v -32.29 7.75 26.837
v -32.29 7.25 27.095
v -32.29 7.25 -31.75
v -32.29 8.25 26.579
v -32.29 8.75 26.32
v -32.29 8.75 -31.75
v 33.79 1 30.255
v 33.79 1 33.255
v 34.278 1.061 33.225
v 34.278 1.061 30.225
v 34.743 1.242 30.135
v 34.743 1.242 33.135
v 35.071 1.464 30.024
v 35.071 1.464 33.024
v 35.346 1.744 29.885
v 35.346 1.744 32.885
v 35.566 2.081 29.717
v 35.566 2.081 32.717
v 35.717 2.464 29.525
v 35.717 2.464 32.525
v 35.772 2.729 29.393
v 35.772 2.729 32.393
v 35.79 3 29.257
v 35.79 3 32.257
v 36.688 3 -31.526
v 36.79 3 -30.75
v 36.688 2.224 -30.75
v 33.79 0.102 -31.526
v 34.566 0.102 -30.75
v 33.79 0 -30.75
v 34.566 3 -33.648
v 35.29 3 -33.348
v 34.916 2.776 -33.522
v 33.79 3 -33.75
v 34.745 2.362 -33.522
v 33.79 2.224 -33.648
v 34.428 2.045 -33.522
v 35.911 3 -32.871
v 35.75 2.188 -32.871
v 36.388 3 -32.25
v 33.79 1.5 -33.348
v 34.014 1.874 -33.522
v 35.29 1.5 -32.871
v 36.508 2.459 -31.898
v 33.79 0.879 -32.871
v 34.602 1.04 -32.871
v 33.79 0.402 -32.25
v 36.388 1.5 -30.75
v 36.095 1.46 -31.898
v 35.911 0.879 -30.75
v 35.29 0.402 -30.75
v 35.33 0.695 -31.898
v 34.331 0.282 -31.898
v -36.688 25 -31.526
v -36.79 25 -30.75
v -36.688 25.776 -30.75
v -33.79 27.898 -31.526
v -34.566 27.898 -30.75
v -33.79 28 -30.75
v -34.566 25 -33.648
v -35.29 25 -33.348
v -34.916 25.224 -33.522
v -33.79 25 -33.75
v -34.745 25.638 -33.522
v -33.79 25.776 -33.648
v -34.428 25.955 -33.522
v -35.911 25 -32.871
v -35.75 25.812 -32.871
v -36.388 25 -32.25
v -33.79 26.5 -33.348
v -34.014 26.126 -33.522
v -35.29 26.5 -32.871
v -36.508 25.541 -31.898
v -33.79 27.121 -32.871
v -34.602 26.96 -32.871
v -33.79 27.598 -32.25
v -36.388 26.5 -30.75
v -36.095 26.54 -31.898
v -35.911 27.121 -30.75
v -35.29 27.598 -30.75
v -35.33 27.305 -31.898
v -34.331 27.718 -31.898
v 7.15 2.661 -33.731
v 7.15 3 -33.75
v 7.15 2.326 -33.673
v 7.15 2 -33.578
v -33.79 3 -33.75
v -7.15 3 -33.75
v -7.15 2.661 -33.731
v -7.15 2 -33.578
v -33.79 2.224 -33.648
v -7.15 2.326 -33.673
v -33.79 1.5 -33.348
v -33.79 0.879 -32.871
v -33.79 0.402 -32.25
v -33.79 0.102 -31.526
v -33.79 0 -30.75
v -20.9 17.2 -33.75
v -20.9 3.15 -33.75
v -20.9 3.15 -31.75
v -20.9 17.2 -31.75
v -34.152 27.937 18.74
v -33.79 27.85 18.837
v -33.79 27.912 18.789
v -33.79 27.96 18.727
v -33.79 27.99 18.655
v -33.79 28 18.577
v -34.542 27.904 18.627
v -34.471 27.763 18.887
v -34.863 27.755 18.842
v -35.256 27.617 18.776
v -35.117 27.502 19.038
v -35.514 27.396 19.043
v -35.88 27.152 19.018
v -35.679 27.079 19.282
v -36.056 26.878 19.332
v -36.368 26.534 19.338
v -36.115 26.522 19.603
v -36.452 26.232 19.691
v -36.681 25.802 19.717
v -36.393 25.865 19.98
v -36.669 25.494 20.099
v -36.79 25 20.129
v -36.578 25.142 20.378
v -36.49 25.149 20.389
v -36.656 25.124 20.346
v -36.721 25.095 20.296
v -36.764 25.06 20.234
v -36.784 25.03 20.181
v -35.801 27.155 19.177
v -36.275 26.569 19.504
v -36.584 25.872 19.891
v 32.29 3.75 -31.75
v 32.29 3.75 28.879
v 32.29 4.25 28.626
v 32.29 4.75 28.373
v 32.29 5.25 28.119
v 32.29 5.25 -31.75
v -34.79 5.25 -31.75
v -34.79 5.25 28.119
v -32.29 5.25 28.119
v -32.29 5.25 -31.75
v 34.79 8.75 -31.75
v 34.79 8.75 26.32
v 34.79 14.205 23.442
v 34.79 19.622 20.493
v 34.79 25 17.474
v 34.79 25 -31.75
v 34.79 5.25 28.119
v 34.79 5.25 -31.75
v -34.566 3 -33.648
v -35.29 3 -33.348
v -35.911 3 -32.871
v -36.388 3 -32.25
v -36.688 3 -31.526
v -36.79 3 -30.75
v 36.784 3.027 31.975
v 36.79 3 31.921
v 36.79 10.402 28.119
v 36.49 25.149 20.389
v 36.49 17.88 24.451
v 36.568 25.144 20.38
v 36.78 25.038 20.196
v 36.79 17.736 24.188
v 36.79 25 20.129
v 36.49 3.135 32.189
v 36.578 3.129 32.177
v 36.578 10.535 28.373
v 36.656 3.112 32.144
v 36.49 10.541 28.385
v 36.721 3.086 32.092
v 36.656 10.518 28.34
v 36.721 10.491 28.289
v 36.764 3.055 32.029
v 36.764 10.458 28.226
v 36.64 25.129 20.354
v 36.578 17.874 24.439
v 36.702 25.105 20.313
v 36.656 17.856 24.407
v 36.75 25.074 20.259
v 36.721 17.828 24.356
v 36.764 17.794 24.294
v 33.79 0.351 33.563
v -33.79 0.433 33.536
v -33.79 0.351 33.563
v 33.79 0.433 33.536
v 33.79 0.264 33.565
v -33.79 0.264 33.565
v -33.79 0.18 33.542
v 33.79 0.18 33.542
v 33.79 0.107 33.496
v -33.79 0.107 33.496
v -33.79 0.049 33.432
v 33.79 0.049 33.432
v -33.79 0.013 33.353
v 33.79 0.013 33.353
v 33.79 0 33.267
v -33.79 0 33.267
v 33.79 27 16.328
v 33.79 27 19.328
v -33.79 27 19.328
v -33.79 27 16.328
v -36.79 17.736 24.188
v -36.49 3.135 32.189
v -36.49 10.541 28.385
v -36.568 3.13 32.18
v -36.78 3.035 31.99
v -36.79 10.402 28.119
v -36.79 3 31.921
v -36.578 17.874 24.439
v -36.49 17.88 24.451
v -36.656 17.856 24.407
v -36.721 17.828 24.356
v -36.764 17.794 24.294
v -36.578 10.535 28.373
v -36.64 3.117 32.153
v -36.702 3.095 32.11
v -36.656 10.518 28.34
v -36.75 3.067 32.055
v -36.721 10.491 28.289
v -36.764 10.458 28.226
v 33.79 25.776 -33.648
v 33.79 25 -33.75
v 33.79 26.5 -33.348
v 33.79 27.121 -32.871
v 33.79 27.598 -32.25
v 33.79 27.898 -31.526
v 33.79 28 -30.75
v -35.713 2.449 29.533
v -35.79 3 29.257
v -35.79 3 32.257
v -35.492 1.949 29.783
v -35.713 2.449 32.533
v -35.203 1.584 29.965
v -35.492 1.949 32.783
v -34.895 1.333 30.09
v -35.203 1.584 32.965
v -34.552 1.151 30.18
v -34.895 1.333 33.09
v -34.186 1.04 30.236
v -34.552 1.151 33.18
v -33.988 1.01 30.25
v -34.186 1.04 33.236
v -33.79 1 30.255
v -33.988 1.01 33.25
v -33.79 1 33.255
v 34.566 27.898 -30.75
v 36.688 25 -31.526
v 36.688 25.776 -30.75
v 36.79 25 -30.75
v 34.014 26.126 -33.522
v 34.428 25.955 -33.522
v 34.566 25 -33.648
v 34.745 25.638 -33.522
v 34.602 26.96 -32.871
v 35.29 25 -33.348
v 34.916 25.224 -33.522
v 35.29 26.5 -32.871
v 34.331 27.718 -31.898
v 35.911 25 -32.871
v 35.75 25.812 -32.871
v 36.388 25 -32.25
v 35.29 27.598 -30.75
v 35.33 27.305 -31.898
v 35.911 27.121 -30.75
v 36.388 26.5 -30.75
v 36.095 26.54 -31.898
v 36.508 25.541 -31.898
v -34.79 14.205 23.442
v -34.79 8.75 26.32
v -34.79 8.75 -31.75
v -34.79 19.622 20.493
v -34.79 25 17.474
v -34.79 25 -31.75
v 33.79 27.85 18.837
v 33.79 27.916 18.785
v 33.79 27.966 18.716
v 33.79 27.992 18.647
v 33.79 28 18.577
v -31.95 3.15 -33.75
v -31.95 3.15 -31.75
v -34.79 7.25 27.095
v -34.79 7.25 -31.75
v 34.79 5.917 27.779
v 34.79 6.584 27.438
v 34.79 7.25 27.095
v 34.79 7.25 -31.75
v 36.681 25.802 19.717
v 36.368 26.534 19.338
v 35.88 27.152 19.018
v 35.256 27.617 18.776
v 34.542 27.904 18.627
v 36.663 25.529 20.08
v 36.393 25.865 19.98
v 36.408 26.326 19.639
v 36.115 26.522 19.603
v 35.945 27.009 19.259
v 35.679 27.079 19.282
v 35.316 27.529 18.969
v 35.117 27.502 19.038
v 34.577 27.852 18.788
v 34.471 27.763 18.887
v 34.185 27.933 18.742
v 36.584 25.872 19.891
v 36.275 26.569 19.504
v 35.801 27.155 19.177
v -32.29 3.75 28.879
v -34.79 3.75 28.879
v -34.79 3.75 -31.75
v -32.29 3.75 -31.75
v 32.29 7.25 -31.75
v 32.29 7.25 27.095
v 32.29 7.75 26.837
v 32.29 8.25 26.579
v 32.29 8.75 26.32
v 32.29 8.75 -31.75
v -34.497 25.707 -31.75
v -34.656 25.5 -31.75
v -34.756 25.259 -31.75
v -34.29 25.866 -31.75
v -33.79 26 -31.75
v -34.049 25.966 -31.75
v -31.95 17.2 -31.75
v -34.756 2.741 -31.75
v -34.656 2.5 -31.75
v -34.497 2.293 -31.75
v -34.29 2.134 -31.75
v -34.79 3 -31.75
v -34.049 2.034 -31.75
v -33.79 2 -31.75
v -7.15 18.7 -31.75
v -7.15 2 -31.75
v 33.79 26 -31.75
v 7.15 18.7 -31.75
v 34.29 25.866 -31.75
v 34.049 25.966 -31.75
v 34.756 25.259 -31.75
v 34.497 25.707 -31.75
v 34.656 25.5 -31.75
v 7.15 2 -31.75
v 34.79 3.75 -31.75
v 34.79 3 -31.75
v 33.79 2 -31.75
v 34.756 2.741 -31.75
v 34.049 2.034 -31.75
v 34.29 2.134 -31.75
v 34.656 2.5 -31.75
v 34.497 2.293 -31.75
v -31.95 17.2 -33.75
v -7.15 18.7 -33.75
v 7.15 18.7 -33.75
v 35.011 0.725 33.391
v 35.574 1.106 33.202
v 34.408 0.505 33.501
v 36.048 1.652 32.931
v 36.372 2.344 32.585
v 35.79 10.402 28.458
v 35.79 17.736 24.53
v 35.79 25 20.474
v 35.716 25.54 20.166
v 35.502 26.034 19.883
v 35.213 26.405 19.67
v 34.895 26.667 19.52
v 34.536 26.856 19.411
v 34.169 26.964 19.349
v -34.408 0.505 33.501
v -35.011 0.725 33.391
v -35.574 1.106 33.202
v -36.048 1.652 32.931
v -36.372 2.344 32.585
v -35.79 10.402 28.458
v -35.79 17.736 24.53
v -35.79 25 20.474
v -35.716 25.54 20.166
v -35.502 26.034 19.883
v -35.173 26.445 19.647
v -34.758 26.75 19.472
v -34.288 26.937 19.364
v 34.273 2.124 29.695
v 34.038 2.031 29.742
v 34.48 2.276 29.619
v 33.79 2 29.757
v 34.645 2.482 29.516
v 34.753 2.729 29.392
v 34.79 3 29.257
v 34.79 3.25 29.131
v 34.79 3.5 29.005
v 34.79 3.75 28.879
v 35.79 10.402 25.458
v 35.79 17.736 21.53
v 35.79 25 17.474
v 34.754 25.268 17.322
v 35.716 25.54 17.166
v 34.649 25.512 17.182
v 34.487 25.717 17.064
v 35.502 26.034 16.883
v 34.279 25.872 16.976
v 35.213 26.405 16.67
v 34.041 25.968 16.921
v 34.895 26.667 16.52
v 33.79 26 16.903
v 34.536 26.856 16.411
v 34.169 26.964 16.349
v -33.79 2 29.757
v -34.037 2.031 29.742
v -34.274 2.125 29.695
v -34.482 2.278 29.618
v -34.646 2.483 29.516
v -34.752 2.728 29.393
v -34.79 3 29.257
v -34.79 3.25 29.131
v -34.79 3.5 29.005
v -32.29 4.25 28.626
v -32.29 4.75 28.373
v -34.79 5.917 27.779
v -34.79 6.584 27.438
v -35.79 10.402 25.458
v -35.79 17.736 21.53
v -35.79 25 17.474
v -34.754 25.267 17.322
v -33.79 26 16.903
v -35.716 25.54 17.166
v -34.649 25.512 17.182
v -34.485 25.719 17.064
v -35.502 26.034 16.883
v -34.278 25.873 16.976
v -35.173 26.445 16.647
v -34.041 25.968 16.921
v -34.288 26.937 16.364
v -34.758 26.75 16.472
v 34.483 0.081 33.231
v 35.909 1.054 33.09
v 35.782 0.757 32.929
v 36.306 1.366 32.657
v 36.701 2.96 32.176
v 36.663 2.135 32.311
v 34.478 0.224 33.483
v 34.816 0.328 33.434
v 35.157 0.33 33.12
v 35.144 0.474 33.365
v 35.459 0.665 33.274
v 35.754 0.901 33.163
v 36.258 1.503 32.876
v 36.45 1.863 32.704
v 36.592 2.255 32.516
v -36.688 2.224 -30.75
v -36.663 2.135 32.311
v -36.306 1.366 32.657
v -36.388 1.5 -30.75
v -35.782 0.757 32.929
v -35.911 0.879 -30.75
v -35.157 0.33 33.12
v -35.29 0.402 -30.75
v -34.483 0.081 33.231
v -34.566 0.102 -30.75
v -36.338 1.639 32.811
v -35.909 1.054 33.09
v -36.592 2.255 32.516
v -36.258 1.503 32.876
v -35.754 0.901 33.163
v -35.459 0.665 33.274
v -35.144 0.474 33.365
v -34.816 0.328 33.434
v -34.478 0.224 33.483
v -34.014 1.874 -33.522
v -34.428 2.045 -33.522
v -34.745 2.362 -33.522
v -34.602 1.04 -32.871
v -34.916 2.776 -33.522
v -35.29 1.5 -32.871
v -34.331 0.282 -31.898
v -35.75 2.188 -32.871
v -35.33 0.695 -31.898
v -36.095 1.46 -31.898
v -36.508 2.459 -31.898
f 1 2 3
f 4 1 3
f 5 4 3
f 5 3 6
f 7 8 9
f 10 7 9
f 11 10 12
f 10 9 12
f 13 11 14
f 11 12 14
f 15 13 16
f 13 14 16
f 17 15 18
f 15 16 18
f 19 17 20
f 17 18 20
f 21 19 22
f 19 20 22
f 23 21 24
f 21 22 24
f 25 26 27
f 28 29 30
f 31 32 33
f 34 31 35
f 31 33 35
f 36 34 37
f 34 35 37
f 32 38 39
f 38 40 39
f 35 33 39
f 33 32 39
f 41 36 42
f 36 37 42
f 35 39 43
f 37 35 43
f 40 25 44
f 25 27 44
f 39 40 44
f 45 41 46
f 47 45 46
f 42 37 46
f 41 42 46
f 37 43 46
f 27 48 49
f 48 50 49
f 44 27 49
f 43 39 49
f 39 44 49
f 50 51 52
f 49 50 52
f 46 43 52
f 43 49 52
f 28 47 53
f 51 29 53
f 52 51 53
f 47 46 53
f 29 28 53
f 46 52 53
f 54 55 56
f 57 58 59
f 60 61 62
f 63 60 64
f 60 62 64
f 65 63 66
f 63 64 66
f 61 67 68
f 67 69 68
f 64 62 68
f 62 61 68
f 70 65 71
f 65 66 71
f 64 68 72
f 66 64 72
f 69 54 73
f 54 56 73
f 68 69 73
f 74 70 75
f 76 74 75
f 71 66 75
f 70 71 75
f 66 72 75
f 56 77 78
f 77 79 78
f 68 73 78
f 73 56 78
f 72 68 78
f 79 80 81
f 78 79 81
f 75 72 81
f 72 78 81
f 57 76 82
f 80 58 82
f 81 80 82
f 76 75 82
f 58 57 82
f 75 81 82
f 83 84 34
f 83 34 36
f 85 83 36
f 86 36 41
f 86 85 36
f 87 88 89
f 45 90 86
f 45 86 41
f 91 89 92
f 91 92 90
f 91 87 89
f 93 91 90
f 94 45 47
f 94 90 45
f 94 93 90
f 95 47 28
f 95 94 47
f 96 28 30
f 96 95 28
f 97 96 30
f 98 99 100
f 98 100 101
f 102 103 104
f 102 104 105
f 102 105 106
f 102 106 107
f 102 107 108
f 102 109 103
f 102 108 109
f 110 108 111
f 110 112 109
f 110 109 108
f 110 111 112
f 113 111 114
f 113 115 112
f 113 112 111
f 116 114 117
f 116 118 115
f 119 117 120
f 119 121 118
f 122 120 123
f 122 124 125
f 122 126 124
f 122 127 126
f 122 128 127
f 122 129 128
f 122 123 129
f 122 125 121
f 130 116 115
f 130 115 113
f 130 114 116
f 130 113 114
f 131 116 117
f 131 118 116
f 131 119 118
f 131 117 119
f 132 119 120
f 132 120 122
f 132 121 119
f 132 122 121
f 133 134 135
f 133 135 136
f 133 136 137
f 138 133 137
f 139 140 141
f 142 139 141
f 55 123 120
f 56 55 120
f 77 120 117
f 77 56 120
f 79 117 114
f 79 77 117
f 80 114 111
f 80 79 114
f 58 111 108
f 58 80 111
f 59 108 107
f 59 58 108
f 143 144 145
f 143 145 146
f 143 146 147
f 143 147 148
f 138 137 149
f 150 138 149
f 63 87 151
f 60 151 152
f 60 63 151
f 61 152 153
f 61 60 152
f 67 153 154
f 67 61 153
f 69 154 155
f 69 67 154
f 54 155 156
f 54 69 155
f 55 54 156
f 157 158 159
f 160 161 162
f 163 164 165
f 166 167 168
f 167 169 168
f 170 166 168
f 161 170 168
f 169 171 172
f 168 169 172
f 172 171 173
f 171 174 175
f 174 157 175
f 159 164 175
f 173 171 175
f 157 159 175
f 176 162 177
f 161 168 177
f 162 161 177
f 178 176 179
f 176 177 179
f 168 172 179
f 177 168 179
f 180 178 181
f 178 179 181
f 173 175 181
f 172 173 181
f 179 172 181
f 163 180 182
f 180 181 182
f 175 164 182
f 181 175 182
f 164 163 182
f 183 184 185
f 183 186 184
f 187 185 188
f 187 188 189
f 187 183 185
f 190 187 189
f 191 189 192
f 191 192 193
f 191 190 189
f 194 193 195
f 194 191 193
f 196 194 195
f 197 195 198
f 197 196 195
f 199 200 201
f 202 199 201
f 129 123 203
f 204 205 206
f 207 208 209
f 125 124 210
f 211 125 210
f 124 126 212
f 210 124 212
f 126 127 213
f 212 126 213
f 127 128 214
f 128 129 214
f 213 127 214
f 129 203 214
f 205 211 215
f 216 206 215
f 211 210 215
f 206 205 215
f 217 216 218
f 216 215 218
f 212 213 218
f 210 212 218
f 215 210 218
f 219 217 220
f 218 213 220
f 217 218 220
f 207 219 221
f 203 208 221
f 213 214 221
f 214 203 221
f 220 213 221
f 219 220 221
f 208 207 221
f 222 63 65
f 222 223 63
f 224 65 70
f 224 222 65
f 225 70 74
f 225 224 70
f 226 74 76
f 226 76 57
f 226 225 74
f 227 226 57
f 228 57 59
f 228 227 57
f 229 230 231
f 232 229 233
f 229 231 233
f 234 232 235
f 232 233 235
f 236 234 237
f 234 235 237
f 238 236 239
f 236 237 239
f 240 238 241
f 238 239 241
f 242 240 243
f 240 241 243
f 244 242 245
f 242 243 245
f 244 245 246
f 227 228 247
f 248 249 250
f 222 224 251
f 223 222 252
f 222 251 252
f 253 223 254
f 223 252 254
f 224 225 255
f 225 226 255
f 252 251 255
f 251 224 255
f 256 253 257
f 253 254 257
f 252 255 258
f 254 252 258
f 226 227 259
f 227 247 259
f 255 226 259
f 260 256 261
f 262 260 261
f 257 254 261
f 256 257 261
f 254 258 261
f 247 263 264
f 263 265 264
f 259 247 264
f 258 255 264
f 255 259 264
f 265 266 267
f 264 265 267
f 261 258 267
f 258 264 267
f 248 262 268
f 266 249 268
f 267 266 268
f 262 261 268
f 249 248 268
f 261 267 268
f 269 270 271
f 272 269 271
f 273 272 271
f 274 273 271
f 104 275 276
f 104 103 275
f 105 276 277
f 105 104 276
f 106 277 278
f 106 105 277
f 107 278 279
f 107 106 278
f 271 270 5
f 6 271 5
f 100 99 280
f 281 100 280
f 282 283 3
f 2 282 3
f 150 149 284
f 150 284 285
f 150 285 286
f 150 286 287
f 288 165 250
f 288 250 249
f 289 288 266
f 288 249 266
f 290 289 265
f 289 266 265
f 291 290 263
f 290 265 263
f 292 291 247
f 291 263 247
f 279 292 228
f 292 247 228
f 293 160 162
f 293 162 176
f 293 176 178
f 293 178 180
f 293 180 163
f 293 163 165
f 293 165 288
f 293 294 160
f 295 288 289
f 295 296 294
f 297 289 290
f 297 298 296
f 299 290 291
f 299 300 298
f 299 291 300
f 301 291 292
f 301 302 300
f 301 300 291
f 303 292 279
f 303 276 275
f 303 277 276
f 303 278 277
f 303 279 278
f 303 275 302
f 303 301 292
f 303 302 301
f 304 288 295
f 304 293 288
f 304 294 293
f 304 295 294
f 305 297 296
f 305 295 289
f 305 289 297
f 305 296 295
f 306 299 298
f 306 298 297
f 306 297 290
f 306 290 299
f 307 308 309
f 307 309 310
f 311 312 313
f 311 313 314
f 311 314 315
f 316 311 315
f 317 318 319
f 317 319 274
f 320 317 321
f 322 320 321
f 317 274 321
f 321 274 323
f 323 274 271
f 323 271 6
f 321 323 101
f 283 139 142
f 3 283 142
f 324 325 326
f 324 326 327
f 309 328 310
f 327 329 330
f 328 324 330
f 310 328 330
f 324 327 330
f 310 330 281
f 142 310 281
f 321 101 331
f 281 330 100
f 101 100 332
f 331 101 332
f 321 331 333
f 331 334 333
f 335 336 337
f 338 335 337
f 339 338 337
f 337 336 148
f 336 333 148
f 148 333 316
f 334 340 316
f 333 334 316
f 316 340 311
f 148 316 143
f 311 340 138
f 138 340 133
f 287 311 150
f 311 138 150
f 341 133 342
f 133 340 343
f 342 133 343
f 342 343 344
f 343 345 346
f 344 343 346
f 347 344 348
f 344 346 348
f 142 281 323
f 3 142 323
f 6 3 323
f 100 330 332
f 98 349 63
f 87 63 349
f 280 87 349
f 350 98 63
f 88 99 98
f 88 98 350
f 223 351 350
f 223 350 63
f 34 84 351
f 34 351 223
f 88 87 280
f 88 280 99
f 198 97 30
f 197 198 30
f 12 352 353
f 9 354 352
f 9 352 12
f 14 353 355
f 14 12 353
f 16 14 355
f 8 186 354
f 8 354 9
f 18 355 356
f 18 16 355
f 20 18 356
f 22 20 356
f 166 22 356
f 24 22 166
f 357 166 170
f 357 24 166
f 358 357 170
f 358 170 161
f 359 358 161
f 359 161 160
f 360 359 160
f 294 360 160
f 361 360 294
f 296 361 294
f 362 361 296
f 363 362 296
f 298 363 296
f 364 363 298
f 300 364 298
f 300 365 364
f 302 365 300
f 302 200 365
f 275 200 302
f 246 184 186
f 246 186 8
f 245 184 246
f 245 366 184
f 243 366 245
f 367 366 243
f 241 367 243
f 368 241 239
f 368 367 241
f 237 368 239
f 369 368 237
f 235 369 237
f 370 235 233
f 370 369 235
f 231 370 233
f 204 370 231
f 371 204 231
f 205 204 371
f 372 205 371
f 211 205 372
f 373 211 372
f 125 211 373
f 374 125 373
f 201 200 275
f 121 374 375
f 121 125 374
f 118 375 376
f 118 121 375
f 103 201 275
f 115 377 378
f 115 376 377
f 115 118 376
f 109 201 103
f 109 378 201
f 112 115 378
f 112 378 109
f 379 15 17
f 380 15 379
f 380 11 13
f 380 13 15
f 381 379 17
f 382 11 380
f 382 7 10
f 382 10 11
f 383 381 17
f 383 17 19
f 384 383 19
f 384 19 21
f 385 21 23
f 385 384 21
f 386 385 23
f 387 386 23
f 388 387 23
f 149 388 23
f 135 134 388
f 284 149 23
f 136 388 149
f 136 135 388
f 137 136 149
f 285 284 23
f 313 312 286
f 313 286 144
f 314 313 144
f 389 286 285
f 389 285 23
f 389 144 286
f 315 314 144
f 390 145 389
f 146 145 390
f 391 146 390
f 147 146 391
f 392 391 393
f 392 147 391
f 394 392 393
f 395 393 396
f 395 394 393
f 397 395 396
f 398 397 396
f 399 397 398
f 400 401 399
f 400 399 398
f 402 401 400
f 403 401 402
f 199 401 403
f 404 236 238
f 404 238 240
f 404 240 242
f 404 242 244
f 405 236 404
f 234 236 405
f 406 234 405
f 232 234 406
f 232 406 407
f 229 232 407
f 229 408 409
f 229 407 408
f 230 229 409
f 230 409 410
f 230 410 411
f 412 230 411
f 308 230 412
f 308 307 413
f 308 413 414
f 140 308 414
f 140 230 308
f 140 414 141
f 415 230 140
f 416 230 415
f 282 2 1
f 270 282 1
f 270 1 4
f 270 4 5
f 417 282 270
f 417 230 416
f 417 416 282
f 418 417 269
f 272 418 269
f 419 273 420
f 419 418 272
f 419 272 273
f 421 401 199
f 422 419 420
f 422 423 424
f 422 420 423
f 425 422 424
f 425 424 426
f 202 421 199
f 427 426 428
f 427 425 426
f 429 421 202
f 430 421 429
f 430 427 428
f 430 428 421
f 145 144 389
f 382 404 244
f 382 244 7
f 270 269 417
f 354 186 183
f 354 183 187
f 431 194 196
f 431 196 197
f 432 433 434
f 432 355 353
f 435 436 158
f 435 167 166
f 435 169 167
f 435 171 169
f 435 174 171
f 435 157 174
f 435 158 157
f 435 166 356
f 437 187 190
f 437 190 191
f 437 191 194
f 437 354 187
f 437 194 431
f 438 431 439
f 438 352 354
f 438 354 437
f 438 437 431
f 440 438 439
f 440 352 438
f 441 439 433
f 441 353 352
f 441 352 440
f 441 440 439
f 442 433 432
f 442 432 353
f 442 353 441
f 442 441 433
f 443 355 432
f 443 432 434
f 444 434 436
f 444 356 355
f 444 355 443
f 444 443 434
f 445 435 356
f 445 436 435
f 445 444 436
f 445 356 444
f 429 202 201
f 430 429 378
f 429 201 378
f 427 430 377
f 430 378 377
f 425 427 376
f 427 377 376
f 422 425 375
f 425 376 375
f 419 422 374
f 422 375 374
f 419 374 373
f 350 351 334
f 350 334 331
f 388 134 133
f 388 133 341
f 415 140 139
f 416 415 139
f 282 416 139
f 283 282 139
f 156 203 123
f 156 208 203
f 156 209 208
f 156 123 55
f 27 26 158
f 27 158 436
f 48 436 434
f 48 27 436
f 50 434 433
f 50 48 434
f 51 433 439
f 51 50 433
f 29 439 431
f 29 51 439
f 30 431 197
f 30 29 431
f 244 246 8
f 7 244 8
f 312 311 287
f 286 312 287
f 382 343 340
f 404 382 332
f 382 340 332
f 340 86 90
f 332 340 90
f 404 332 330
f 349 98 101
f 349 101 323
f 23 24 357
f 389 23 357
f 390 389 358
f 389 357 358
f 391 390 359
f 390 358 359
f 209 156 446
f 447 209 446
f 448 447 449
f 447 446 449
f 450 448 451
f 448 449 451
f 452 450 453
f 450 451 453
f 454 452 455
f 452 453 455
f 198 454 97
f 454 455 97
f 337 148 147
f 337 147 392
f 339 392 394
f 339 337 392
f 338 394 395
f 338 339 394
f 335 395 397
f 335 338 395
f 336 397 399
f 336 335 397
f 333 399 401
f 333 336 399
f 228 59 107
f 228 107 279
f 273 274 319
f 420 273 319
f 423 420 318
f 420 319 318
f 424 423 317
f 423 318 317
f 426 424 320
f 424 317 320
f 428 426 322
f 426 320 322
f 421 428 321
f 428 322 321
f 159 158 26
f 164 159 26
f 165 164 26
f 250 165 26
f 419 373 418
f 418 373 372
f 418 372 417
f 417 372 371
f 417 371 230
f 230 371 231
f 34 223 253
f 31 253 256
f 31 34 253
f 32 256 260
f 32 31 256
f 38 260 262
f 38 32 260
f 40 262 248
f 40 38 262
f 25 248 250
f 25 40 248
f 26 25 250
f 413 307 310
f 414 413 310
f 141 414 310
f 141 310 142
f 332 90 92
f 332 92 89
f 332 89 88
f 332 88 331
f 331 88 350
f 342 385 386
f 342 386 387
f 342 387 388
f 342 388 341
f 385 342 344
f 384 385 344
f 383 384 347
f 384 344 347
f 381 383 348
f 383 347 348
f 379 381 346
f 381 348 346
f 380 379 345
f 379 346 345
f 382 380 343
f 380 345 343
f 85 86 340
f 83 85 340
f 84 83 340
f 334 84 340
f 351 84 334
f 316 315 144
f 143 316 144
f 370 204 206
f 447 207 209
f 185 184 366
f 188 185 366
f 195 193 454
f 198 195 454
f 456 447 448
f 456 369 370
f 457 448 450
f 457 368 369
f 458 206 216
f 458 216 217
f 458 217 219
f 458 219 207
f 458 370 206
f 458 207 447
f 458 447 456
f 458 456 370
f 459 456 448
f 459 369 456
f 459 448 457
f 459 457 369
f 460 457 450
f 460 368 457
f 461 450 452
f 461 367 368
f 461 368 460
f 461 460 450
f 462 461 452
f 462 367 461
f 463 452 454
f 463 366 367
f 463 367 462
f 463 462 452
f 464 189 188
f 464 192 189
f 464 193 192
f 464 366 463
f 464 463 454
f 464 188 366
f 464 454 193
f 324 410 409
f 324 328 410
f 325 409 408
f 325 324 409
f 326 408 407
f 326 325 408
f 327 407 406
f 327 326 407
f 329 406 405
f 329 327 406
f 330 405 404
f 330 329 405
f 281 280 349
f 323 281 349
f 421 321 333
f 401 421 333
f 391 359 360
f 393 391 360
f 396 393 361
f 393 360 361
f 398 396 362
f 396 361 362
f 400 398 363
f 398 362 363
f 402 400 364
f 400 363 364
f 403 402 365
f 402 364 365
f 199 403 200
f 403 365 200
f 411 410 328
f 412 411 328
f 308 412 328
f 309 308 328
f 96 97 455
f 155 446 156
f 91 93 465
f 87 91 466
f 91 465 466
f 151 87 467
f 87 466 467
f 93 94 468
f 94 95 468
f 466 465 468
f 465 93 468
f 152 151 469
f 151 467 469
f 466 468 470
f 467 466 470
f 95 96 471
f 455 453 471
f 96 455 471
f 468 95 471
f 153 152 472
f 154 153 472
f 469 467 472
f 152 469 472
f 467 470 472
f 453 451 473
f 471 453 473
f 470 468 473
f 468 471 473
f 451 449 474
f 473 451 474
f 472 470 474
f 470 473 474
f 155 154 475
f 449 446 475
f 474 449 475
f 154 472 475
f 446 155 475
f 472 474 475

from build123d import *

# Parameters (mm, degrees)
SKETCH1_W                = 73.58
SKETCH1_H                = 67.5
BOSS_EXTRUDE1_DEPTH      = 28
FILLET1_R                = 3
SHELL1_T                 = -2
CUT_EXTRUDE1_DEPTH       = 86.656750464
FILLET2_R                = 3
CUT_EXTRUDE3_REACH       = 162.173
CUT_EXTRUDE3_END_RADIUS  = 475
CUT_EXTRUDE3_START       = 80
FILLET3_R                = 0.3
BOSS_EXTRUDE2_REACH      = 82.024
BOSS_EXTRUDE2_END_RADIUS = 475
SKETCH5_W                = 2.5
SKETCH5_H                = 1.5
SKETCH6_W                = 14.3
SKETCH6_H                = 16.7
SKETCH6_W_2              = 11.05
SKETCH6_H_2              = 14.049996967
CUT_EXTRUDE4_DEPTH       = 2


with BuildPart() as part:
    # Sketch1 → Boss-Extrude1 (new body)
    with BuildSketch(Plane(origin=(0, 0, 0), x_dir=(1, 0, 0), z_dir=(0, 1, 0))):
        Rectangle(SKETCH1_W, SKETCH1_H)
    extrude(amount=BOSS_EXTRUDE1_DEPTH)

    # Fillet1
    fillet1_edges = [part.edges().sort_by_distance(p)[0] for p in [
        (-36.79, 28, 0),
        (36.79, 28, 0),
        (-36.79, 0, 0),
        (36.79, 0, 0),
    ]]
    fillet(fillet1_edges, radius=FILLET1_R)

    # Shell1
    shell1_openings = [part.faces().sort_by_distance(p)[0] for p in [
        (0, 14, 33.75),
    ]]
    offset(amount=SHELL1_T, openings=shell1_openings, kind=Kind.INTERSECTION)

    # Sketch2 → Cut-Extrude1 (cut, through all)
    with BuildSketch(Plane.ZY.offset(36.79)):
        with BuildLine():
            Line((18.75, 28), (33.75, 28))
            Line((33.75, 28), (33.75, 0))
            ThreePointArc((33.75, 0), (26.484121584, 14.125422277), (18.75, 28))
        make_face()
    extrude(amount=-CUT_EXTRUDE1_DEPTH, mode=Mode.SUBTRACT)

    # Fillet2
    fillet2_edges = [part.edges().sort_by_distance(p)[0] for p in [
        (0, 28, -33.75),
        (0, 0, -33.75),
        (-36.79, 14, -33.75),
        (36.79, 14, -33.75),
        (-35.911320344, 27.121320344, -33.75),
        (-35.911320344, 0.878679656, -33.75),
        (35.911320344, 0.878679656, -33.75),
        (35.911320344, 27.121320344, -33.75),
    ]]
    fillet(fillet2_edges, radius=FILLET2_R)

    # Cut-Extrude3: up to this cylinder (the profile starts outside it)
    cut_extrude3_end = Plane(origin=(0, -210.179748667, -395.218864179), z_dir=(-1, 0, 0)) * Cylinder(CUT_EXTRUDE3_END_RADIUS, 1275.346, mode=Mode.PRIVATE)
    # Sketch4 → Cut-Extrude3 (cut, up to the surface)
    with BuildSketch(Plane.XY.offset(-31.75).offset(CUT_EXTRUDE3_START), mode=Mode.PRIVATE) as cut_extrude3_sk1:
        with BuildLine():
            Line((33.79, 27), (-33.79, 27))
            ThreePointArc((-33.79, 27), (-35.204213562, 26.414213562), (-35.79, 25))
            Line((-35.79, 25), (-35.79, 3))
            ThreePointArc((-35.79, 3), (-35.204213562, 1.585786438), (-33.79, 1))
            Line((-33.79, 1), (33.79, 1))
            ThreePointArc((33.79, 1), (35.204213562, 1.585786438), (35.79, 3))
            Line((35.79, 3), (35.79, 25))
            ThreePointArc((35.79, 25), (35.204213562, 26.414213562), (33.79, 27))
        make_face()
        with BuildLine():
            Line((33.79, 26), (-33.79, 26))
            ThreePointArc((-33.79, 26), (-34.497106781, 25.707106781), (-34.79, 25))
            Line((-34.79, 25), (-34.79, 3))
            ThreePointArc((-34.79, 3), (-34.497106781, 2.292893219), (-33.79, 2))
            Line((-33.79, 2), (33.79, 2))
            ThreePointArc((33.79, 2), (34.497106781, 2.292893219), (34.79, 3))
            Line((34.79, 3), (34.79, 25))
            ThreePointArc((34.79, 25), (34.497106781, 25.707106781), (33.79, 26))
        make_face(mode=Mode.SUBTRACT)
    cut_extrude3_tool1 = extrude(cut_extrude3_sk1.sketch, amount=-CUT_EXTRUDE3_REACH, mode=Mode.PRIVATE) - cut_extrude3_end
    add(cut_extrude3_tool1.solids().sort_by_distance((0, 26.238443, 48.25))[0], mode=Mode.SUBTRACT)

    # Fillet3
    fillet3_edges = [part.edges().sort_by_distance(p)[0] for p in [
        (0, 0, 33.75),
        (-36.79, 14.077394683, 26.509847108),
        (35.984331752, 27.045704827, 19.301590008),
        (35.969562436, 0.938566613, 33.285609296),
        (-35.969562436, 0.938566613, 33.285609296),
        (-35.984331752, 27.045704827, 19.301590008),
        (36.79, 14.077394683, 26.509847108),
        (0, 28, 18.75),
    ]]
    fillet(fillet3_edges, radius=FILLET3_R)

    # Boss-Extrude2: up to this cylinder (the profile starts inside it)
    boss_extrude2_end = Plane(origin=(0, -210.179748667, -395.218864179), z_dir=(-1, 0, 0)) * Cylinder(BOSS_EXTRUDE2_END_RADIUS, 1182.128, mode=Mode.PRIVATE)
    # Sketch5 → Boss-Extrude2 (add, up to the surface)
    with BuildSketch(Plane.XY.offset(-31.75), mode=Mode.PRIVATE) as boss_extrude2_sk1:
        with Locations((33.54, 4.5)):
            Rectangle(SKETCH5_W, SKETCH5_H)
    boss_extrude2_tool1 = extrude(boss_extrude2_sk1.sketch, amount=BOSS_EXTRUDE2_REACH, mode=Mode.PRIVATE) & boss_extrude2_end
    add(boss_extrude2_tool1.solids().sort_by_distance((33.54, 4.5, -31.75))[0])
    # Sketch5 → Boss-Extrude2 (add, up to the surface)
    with BuildSketch(Plane.XY.offset(-31.75), mode=Mode.PRIVATE) as boss_extrude2_sk2:
        with Locations((33.54, 8)):
            Rectangle(SKETCH5_W, SKETCH5_H)
    boss_extrude2_tool2 = extrude(boss_extrude2_sk2.sketch, amount=BOSS_EXTRUDE2_REACH, mode=Mode.PRIVATE) & boss_extrude2_end
    add(boss_extrude2_tool2.solids().sort_by_distance((33.54, 8, -31.75))[0])
    # Sketch5 → Boss-Extrude2 (add, up to the surface)
    with BuildSketch(Plane.XY.offset(-31.75), mode=Mode.PRIVATE) as boss_extrude2_sk3:
        with Locations((-33.54, 8)):
            Rectangle(SKETCH5_W, SKETCH5_H)
    boss_extrude2_tool3 = extrude(boss_extrude2_sk3.sketch, amount=BOSS_EXTRUDE2_REACH, mode=Mode.PRIVATE) & boss_extrude2_end
    add(boss_extrude2_tool3.solids().sort_by_distance((-33.54, 8, -31.75))[0])
    # Sketch5 → Boss-Extrude2 (add, up to the surface)
    with BuildSketch(Plane.XY.offset(-31.75), mode=Mode.PRIVATE) as boss_extrude2_sk4:
        with Locations((-33.54, 4.5)):
            Rectangle(SKETCH5_W, SKETCH5_H)
    boss_extrude2_tool4 = extrude(boss_extrude2_sk4.sketch, amount=BOSS_EXTRUDE2_REACH, mode=Mode.PRIVATE) & boss_extrude2_end
    add(boss_extrude2_tool4.solids().sort_by_distance((-33.54, 4.5, -31.75))[0])

    # Sketch6 → Cut-Extrude4 (cut)
    with BuildSketch(Plane(origin=(0, 0, -33.75), x_dir=(-1, 0, 0), z_dir=(0, 0, -1))):
        with Locations((0, 10.35)):
            Rectangle(SKETCH6_W, SKETCH6_H)
        with Locations((26.425, 10.175001517)):
            Rectangle(SKETCH6_W_2, SKETCH6_H_2)
    extrude(amount=-CUT_EXTRUDE4_DEPTH, mode=Mode.SUBTRACT)


solid = part.part
